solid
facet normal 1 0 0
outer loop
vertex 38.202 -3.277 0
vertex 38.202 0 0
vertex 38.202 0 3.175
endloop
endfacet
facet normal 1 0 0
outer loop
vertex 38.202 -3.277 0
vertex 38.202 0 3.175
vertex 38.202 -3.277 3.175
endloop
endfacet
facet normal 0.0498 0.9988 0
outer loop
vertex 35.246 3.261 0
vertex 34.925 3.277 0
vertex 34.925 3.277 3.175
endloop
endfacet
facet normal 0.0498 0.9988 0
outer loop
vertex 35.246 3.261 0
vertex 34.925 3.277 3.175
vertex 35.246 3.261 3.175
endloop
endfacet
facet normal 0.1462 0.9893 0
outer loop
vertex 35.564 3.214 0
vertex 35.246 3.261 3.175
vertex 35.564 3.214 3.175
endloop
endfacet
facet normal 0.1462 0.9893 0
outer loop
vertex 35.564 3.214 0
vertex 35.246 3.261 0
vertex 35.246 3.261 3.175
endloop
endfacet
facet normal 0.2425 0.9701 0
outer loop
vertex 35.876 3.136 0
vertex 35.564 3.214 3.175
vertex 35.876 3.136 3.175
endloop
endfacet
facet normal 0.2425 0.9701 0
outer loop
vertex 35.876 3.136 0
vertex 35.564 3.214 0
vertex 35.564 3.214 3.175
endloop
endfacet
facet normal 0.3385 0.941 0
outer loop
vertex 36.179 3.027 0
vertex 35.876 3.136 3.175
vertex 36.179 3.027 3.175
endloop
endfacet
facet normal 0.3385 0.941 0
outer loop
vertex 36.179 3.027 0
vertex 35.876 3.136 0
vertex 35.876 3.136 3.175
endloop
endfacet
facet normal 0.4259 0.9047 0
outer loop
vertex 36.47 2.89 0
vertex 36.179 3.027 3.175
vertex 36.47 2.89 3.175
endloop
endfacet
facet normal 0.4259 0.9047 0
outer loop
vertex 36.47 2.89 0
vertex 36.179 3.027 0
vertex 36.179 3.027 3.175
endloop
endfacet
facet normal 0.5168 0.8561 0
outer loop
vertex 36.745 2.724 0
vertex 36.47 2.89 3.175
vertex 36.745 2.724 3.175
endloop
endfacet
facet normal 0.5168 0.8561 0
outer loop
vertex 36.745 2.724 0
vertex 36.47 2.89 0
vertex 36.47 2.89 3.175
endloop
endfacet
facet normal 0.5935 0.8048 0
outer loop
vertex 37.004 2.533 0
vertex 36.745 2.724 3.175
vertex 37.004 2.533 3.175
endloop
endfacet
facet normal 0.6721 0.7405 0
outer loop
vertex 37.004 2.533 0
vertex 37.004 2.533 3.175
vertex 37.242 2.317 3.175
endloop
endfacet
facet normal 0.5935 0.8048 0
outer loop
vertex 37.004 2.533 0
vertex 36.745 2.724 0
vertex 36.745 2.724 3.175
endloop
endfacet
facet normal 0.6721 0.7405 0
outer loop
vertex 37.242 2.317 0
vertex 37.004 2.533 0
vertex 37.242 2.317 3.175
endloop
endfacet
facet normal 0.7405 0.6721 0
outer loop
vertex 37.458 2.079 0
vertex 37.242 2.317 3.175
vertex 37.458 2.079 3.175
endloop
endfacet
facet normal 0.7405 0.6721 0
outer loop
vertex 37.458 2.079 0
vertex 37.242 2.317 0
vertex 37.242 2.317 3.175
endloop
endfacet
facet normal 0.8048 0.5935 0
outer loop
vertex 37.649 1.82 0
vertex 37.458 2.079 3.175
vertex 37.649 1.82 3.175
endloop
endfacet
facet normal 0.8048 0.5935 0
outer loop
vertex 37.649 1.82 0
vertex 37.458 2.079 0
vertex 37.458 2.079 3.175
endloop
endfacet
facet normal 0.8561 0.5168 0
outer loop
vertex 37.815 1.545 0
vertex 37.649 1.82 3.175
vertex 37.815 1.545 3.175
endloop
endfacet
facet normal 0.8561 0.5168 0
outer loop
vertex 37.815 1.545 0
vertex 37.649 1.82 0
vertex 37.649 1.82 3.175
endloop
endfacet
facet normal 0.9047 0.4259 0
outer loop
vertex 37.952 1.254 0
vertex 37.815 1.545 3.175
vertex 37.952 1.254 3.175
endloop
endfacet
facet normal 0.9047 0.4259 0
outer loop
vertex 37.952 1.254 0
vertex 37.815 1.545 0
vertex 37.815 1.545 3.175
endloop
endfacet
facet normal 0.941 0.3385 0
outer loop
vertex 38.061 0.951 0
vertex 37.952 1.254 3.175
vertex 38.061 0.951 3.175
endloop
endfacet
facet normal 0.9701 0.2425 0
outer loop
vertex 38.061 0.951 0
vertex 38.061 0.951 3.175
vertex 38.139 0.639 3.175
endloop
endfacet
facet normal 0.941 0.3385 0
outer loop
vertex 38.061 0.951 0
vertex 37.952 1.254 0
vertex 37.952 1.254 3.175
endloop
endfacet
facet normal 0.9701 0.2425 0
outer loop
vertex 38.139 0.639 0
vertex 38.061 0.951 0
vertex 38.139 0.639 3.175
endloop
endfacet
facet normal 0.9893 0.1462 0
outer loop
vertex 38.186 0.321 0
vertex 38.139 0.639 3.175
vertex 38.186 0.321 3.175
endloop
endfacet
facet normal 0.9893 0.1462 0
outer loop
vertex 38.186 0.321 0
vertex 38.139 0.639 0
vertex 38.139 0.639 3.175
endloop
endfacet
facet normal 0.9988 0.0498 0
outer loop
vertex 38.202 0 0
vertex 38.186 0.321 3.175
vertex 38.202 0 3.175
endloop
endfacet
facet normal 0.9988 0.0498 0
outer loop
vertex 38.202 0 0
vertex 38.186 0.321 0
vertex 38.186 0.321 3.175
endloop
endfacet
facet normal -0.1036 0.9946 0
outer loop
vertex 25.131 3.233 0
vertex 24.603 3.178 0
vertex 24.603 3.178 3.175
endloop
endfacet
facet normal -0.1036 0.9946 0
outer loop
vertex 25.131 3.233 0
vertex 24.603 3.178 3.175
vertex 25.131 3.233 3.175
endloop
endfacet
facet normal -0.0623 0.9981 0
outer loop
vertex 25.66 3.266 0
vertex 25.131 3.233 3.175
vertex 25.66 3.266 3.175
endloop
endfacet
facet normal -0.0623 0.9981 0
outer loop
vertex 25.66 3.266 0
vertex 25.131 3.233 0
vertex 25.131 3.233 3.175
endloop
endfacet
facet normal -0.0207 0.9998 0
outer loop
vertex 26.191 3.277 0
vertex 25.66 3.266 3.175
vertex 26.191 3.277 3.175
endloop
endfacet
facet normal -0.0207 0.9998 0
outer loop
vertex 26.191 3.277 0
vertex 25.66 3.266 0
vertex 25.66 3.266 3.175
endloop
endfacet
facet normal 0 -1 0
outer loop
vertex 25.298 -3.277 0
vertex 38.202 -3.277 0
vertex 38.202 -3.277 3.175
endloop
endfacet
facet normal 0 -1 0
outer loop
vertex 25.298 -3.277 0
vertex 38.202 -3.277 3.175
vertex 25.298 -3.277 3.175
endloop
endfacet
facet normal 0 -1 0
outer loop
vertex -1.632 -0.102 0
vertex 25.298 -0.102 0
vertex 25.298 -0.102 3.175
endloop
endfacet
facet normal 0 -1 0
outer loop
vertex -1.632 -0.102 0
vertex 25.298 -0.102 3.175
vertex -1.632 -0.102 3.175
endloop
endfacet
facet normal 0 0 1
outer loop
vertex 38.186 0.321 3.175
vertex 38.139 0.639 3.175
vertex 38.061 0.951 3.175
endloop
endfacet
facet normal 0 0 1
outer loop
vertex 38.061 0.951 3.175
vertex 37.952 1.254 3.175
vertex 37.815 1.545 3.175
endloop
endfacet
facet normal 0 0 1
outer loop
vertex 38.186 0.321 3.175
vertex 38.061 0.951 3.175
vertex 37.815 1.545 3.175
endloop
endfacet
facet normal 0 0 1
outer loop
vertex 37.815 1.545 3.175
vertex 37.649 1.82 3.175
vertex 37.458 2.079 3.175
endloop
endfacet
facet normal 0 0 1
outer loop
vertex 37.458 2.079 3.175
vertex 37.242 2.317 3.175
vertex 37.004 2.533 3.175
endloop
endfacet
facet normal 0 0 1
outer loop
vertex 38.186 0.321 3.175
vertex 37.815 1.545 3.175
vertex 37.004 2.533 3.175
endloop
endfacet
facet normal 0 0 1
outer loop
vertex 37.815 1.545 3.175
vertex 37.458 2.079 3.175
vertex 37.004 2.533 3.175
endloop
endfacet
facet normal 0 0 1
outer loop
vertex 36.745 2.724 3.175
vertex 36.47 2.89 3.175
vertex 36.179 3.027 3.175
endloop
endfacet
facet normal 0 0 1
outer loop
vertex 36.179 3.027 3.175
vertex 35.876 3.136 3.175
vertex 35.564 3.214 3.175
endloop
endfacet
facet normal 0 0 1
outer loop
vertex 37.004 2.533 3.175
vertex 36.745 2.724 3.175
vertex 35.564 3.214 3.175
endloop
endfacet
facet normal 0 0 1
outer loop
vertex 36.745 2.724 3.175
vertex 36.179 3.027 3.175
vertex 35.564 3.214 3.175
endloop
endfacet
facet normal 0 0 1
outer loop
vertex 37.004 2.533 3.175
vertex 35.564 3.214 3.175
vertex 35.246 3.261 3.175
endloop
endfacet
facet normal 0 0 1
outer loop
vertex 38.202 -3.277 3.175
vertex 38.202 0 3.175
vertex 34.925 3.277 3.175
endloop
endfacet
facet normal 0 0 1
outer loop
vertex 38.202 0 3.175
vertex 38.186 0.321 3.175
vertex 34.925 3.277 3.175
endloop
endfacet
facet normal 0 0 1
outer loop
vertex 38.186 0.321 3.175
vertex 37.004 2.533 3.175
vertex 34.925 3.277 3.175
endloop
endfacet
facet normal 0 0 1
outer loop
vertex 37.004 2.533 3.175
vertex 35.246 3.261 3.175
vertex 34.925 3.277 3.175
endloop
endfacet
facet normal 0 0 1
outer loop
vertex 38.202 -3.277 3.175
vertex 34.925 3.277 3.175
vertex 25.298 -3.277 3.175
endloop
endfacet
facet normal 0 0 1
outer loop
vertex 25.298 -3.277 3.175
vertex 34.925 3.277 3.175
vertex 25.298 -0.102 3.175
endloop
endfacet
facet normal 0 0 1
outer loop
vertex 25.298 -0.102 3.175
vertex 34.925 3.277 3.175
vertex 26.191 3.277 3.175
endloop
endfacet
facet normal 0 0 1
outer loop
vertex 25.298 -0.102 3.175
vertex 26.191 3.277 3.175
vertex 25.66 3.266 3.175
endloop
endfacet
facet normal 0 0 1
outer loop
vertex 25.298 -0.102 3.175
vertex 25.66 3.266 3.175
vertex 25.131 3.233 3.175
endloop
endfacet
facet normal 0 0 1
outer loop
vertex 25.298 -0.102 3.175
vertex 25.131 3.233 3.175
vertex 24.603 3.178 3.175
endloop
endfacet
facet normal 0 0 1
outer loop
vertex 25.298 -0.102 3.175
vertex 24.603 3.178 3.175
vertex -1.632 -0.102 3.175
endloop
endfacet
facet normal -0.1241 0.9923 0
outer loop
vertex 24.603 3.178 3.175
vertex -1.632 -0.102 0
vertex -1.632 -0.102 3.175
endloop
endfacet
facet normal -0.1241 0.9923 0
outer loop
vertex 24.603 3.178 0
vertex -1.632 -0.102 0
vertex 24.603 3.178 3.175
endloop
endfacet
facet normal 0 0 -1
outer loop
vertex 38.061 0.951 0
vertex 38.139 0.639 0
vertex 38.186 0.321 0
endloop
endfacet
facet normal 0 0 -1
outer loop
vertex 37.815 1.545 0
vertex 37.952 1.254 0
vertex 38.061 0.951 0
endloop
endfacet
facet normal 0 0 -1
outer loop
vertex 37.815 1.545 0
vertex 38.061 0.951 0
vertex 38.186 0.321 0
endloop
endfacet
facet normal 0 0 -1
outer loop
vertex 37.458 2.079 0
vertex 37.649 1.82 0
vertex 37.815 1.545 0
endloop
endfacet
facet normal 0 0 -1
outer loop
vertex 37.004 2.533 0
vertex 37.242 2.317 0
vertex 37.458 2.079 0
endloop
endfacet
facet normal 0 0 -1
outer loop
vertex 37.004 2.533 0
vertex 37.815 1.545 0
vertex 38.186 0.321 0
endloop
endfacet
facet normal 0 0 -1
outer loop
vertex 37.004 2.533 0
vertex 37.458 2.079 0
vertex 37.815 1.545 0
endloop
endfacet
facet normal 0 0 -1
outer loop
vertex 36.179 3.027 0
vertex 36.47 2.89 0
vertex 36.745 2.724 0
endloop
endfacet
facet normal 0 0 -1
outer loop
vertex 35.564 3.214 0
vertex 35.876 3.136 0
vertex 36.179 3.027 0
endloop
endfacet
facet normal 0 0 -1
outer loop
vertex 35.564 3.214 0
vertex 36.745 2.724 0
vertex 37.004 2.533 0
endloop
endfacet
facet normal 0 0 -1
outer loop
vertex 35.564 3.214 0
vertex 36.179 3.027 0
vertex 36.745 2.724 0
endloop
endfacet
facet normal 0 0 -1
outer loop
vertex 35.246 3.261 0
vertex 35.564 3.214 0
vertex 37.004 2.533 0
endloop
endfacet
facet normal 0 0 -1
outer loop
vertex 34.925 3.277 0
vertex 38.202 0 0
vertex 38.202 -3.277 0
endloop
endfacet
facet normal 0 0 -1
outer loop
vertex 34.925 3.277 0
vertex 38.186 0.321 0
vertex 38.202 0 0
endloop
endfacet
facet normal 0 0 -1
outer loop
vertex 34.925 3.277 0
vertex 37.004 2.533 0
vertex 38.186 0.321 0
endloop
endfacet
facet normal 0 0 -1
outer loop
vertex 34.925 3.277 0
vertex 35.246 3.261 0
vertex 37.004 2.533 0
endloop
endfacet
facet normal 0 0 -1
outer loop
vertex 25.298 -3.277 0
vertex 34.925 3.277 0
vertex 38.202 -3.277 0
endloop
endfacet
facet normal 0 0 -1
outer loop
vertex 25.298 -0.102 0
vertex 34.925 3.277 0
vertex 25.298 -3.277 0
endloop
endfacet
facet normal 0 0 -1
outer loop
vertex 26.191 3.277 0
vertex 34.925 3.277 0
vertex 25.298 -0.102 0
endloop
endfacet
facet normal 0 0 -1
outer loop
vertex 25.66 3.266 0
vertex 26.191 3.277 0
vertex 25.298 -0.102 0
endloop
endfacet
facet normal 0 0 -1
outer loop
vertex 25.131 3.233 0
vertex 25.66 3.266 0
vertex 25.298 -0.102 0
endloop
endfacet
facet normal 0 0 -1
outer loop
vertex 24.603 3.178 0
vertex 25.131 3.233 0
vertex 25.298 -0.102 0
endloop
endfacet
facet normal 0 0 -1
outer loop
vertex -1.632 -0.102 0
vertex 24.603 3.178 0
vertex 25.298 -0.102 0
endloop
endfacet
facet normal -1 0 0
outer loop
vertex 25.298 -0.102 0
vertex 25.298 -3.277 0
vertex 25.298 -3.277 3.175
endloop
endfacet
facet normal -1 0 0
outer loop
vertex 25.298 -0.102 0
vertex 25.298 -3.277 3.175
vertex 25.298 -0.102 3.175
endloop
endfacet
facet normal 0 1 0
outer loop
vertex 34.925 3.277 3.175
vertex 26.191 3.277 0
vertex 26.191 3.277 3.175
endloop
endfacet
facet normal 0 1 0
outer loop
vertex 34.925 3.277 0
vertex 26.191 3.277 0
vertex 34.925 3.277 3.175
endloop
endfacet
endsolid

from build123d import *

# Parameters (mm, degrees)
BOSS_EXTRUDE1_DEPTH = 3.175


with BuildPart() as part:
    # Sketch1 → Boss-Extrude1 (new body)
    with BuildSketch(Plane.XY):
        with BuildLine():
            Line((38.2016, 0), (38.2016, -3.2766))
            Line((38.2016, -3.2766), (25.2984, -3.2766))
            Line((25.2984, -3.2766), (25.2984, -0.1016))
            Line((25.2984, -0.1016), (-1.631925387, -0.1016))
            Line((-1.631925387, -0.1016), (24.602830345, 3.177744467))
            ThreePointArc((24.602830345, 3.177744467), (25.395214732, 3.251862215), (26.190673403, 3.2766))
            Line((26.190673403, 3.2766), (34.925, 3.2766))
            ThreePointArc((34.925, 3.2766), (37.241906079, 2.316906079), (38.2016, 0))
        make_face()
    extrude(amount=BOSS_EXTRUDE1_DEPTH)


solid = part.part
